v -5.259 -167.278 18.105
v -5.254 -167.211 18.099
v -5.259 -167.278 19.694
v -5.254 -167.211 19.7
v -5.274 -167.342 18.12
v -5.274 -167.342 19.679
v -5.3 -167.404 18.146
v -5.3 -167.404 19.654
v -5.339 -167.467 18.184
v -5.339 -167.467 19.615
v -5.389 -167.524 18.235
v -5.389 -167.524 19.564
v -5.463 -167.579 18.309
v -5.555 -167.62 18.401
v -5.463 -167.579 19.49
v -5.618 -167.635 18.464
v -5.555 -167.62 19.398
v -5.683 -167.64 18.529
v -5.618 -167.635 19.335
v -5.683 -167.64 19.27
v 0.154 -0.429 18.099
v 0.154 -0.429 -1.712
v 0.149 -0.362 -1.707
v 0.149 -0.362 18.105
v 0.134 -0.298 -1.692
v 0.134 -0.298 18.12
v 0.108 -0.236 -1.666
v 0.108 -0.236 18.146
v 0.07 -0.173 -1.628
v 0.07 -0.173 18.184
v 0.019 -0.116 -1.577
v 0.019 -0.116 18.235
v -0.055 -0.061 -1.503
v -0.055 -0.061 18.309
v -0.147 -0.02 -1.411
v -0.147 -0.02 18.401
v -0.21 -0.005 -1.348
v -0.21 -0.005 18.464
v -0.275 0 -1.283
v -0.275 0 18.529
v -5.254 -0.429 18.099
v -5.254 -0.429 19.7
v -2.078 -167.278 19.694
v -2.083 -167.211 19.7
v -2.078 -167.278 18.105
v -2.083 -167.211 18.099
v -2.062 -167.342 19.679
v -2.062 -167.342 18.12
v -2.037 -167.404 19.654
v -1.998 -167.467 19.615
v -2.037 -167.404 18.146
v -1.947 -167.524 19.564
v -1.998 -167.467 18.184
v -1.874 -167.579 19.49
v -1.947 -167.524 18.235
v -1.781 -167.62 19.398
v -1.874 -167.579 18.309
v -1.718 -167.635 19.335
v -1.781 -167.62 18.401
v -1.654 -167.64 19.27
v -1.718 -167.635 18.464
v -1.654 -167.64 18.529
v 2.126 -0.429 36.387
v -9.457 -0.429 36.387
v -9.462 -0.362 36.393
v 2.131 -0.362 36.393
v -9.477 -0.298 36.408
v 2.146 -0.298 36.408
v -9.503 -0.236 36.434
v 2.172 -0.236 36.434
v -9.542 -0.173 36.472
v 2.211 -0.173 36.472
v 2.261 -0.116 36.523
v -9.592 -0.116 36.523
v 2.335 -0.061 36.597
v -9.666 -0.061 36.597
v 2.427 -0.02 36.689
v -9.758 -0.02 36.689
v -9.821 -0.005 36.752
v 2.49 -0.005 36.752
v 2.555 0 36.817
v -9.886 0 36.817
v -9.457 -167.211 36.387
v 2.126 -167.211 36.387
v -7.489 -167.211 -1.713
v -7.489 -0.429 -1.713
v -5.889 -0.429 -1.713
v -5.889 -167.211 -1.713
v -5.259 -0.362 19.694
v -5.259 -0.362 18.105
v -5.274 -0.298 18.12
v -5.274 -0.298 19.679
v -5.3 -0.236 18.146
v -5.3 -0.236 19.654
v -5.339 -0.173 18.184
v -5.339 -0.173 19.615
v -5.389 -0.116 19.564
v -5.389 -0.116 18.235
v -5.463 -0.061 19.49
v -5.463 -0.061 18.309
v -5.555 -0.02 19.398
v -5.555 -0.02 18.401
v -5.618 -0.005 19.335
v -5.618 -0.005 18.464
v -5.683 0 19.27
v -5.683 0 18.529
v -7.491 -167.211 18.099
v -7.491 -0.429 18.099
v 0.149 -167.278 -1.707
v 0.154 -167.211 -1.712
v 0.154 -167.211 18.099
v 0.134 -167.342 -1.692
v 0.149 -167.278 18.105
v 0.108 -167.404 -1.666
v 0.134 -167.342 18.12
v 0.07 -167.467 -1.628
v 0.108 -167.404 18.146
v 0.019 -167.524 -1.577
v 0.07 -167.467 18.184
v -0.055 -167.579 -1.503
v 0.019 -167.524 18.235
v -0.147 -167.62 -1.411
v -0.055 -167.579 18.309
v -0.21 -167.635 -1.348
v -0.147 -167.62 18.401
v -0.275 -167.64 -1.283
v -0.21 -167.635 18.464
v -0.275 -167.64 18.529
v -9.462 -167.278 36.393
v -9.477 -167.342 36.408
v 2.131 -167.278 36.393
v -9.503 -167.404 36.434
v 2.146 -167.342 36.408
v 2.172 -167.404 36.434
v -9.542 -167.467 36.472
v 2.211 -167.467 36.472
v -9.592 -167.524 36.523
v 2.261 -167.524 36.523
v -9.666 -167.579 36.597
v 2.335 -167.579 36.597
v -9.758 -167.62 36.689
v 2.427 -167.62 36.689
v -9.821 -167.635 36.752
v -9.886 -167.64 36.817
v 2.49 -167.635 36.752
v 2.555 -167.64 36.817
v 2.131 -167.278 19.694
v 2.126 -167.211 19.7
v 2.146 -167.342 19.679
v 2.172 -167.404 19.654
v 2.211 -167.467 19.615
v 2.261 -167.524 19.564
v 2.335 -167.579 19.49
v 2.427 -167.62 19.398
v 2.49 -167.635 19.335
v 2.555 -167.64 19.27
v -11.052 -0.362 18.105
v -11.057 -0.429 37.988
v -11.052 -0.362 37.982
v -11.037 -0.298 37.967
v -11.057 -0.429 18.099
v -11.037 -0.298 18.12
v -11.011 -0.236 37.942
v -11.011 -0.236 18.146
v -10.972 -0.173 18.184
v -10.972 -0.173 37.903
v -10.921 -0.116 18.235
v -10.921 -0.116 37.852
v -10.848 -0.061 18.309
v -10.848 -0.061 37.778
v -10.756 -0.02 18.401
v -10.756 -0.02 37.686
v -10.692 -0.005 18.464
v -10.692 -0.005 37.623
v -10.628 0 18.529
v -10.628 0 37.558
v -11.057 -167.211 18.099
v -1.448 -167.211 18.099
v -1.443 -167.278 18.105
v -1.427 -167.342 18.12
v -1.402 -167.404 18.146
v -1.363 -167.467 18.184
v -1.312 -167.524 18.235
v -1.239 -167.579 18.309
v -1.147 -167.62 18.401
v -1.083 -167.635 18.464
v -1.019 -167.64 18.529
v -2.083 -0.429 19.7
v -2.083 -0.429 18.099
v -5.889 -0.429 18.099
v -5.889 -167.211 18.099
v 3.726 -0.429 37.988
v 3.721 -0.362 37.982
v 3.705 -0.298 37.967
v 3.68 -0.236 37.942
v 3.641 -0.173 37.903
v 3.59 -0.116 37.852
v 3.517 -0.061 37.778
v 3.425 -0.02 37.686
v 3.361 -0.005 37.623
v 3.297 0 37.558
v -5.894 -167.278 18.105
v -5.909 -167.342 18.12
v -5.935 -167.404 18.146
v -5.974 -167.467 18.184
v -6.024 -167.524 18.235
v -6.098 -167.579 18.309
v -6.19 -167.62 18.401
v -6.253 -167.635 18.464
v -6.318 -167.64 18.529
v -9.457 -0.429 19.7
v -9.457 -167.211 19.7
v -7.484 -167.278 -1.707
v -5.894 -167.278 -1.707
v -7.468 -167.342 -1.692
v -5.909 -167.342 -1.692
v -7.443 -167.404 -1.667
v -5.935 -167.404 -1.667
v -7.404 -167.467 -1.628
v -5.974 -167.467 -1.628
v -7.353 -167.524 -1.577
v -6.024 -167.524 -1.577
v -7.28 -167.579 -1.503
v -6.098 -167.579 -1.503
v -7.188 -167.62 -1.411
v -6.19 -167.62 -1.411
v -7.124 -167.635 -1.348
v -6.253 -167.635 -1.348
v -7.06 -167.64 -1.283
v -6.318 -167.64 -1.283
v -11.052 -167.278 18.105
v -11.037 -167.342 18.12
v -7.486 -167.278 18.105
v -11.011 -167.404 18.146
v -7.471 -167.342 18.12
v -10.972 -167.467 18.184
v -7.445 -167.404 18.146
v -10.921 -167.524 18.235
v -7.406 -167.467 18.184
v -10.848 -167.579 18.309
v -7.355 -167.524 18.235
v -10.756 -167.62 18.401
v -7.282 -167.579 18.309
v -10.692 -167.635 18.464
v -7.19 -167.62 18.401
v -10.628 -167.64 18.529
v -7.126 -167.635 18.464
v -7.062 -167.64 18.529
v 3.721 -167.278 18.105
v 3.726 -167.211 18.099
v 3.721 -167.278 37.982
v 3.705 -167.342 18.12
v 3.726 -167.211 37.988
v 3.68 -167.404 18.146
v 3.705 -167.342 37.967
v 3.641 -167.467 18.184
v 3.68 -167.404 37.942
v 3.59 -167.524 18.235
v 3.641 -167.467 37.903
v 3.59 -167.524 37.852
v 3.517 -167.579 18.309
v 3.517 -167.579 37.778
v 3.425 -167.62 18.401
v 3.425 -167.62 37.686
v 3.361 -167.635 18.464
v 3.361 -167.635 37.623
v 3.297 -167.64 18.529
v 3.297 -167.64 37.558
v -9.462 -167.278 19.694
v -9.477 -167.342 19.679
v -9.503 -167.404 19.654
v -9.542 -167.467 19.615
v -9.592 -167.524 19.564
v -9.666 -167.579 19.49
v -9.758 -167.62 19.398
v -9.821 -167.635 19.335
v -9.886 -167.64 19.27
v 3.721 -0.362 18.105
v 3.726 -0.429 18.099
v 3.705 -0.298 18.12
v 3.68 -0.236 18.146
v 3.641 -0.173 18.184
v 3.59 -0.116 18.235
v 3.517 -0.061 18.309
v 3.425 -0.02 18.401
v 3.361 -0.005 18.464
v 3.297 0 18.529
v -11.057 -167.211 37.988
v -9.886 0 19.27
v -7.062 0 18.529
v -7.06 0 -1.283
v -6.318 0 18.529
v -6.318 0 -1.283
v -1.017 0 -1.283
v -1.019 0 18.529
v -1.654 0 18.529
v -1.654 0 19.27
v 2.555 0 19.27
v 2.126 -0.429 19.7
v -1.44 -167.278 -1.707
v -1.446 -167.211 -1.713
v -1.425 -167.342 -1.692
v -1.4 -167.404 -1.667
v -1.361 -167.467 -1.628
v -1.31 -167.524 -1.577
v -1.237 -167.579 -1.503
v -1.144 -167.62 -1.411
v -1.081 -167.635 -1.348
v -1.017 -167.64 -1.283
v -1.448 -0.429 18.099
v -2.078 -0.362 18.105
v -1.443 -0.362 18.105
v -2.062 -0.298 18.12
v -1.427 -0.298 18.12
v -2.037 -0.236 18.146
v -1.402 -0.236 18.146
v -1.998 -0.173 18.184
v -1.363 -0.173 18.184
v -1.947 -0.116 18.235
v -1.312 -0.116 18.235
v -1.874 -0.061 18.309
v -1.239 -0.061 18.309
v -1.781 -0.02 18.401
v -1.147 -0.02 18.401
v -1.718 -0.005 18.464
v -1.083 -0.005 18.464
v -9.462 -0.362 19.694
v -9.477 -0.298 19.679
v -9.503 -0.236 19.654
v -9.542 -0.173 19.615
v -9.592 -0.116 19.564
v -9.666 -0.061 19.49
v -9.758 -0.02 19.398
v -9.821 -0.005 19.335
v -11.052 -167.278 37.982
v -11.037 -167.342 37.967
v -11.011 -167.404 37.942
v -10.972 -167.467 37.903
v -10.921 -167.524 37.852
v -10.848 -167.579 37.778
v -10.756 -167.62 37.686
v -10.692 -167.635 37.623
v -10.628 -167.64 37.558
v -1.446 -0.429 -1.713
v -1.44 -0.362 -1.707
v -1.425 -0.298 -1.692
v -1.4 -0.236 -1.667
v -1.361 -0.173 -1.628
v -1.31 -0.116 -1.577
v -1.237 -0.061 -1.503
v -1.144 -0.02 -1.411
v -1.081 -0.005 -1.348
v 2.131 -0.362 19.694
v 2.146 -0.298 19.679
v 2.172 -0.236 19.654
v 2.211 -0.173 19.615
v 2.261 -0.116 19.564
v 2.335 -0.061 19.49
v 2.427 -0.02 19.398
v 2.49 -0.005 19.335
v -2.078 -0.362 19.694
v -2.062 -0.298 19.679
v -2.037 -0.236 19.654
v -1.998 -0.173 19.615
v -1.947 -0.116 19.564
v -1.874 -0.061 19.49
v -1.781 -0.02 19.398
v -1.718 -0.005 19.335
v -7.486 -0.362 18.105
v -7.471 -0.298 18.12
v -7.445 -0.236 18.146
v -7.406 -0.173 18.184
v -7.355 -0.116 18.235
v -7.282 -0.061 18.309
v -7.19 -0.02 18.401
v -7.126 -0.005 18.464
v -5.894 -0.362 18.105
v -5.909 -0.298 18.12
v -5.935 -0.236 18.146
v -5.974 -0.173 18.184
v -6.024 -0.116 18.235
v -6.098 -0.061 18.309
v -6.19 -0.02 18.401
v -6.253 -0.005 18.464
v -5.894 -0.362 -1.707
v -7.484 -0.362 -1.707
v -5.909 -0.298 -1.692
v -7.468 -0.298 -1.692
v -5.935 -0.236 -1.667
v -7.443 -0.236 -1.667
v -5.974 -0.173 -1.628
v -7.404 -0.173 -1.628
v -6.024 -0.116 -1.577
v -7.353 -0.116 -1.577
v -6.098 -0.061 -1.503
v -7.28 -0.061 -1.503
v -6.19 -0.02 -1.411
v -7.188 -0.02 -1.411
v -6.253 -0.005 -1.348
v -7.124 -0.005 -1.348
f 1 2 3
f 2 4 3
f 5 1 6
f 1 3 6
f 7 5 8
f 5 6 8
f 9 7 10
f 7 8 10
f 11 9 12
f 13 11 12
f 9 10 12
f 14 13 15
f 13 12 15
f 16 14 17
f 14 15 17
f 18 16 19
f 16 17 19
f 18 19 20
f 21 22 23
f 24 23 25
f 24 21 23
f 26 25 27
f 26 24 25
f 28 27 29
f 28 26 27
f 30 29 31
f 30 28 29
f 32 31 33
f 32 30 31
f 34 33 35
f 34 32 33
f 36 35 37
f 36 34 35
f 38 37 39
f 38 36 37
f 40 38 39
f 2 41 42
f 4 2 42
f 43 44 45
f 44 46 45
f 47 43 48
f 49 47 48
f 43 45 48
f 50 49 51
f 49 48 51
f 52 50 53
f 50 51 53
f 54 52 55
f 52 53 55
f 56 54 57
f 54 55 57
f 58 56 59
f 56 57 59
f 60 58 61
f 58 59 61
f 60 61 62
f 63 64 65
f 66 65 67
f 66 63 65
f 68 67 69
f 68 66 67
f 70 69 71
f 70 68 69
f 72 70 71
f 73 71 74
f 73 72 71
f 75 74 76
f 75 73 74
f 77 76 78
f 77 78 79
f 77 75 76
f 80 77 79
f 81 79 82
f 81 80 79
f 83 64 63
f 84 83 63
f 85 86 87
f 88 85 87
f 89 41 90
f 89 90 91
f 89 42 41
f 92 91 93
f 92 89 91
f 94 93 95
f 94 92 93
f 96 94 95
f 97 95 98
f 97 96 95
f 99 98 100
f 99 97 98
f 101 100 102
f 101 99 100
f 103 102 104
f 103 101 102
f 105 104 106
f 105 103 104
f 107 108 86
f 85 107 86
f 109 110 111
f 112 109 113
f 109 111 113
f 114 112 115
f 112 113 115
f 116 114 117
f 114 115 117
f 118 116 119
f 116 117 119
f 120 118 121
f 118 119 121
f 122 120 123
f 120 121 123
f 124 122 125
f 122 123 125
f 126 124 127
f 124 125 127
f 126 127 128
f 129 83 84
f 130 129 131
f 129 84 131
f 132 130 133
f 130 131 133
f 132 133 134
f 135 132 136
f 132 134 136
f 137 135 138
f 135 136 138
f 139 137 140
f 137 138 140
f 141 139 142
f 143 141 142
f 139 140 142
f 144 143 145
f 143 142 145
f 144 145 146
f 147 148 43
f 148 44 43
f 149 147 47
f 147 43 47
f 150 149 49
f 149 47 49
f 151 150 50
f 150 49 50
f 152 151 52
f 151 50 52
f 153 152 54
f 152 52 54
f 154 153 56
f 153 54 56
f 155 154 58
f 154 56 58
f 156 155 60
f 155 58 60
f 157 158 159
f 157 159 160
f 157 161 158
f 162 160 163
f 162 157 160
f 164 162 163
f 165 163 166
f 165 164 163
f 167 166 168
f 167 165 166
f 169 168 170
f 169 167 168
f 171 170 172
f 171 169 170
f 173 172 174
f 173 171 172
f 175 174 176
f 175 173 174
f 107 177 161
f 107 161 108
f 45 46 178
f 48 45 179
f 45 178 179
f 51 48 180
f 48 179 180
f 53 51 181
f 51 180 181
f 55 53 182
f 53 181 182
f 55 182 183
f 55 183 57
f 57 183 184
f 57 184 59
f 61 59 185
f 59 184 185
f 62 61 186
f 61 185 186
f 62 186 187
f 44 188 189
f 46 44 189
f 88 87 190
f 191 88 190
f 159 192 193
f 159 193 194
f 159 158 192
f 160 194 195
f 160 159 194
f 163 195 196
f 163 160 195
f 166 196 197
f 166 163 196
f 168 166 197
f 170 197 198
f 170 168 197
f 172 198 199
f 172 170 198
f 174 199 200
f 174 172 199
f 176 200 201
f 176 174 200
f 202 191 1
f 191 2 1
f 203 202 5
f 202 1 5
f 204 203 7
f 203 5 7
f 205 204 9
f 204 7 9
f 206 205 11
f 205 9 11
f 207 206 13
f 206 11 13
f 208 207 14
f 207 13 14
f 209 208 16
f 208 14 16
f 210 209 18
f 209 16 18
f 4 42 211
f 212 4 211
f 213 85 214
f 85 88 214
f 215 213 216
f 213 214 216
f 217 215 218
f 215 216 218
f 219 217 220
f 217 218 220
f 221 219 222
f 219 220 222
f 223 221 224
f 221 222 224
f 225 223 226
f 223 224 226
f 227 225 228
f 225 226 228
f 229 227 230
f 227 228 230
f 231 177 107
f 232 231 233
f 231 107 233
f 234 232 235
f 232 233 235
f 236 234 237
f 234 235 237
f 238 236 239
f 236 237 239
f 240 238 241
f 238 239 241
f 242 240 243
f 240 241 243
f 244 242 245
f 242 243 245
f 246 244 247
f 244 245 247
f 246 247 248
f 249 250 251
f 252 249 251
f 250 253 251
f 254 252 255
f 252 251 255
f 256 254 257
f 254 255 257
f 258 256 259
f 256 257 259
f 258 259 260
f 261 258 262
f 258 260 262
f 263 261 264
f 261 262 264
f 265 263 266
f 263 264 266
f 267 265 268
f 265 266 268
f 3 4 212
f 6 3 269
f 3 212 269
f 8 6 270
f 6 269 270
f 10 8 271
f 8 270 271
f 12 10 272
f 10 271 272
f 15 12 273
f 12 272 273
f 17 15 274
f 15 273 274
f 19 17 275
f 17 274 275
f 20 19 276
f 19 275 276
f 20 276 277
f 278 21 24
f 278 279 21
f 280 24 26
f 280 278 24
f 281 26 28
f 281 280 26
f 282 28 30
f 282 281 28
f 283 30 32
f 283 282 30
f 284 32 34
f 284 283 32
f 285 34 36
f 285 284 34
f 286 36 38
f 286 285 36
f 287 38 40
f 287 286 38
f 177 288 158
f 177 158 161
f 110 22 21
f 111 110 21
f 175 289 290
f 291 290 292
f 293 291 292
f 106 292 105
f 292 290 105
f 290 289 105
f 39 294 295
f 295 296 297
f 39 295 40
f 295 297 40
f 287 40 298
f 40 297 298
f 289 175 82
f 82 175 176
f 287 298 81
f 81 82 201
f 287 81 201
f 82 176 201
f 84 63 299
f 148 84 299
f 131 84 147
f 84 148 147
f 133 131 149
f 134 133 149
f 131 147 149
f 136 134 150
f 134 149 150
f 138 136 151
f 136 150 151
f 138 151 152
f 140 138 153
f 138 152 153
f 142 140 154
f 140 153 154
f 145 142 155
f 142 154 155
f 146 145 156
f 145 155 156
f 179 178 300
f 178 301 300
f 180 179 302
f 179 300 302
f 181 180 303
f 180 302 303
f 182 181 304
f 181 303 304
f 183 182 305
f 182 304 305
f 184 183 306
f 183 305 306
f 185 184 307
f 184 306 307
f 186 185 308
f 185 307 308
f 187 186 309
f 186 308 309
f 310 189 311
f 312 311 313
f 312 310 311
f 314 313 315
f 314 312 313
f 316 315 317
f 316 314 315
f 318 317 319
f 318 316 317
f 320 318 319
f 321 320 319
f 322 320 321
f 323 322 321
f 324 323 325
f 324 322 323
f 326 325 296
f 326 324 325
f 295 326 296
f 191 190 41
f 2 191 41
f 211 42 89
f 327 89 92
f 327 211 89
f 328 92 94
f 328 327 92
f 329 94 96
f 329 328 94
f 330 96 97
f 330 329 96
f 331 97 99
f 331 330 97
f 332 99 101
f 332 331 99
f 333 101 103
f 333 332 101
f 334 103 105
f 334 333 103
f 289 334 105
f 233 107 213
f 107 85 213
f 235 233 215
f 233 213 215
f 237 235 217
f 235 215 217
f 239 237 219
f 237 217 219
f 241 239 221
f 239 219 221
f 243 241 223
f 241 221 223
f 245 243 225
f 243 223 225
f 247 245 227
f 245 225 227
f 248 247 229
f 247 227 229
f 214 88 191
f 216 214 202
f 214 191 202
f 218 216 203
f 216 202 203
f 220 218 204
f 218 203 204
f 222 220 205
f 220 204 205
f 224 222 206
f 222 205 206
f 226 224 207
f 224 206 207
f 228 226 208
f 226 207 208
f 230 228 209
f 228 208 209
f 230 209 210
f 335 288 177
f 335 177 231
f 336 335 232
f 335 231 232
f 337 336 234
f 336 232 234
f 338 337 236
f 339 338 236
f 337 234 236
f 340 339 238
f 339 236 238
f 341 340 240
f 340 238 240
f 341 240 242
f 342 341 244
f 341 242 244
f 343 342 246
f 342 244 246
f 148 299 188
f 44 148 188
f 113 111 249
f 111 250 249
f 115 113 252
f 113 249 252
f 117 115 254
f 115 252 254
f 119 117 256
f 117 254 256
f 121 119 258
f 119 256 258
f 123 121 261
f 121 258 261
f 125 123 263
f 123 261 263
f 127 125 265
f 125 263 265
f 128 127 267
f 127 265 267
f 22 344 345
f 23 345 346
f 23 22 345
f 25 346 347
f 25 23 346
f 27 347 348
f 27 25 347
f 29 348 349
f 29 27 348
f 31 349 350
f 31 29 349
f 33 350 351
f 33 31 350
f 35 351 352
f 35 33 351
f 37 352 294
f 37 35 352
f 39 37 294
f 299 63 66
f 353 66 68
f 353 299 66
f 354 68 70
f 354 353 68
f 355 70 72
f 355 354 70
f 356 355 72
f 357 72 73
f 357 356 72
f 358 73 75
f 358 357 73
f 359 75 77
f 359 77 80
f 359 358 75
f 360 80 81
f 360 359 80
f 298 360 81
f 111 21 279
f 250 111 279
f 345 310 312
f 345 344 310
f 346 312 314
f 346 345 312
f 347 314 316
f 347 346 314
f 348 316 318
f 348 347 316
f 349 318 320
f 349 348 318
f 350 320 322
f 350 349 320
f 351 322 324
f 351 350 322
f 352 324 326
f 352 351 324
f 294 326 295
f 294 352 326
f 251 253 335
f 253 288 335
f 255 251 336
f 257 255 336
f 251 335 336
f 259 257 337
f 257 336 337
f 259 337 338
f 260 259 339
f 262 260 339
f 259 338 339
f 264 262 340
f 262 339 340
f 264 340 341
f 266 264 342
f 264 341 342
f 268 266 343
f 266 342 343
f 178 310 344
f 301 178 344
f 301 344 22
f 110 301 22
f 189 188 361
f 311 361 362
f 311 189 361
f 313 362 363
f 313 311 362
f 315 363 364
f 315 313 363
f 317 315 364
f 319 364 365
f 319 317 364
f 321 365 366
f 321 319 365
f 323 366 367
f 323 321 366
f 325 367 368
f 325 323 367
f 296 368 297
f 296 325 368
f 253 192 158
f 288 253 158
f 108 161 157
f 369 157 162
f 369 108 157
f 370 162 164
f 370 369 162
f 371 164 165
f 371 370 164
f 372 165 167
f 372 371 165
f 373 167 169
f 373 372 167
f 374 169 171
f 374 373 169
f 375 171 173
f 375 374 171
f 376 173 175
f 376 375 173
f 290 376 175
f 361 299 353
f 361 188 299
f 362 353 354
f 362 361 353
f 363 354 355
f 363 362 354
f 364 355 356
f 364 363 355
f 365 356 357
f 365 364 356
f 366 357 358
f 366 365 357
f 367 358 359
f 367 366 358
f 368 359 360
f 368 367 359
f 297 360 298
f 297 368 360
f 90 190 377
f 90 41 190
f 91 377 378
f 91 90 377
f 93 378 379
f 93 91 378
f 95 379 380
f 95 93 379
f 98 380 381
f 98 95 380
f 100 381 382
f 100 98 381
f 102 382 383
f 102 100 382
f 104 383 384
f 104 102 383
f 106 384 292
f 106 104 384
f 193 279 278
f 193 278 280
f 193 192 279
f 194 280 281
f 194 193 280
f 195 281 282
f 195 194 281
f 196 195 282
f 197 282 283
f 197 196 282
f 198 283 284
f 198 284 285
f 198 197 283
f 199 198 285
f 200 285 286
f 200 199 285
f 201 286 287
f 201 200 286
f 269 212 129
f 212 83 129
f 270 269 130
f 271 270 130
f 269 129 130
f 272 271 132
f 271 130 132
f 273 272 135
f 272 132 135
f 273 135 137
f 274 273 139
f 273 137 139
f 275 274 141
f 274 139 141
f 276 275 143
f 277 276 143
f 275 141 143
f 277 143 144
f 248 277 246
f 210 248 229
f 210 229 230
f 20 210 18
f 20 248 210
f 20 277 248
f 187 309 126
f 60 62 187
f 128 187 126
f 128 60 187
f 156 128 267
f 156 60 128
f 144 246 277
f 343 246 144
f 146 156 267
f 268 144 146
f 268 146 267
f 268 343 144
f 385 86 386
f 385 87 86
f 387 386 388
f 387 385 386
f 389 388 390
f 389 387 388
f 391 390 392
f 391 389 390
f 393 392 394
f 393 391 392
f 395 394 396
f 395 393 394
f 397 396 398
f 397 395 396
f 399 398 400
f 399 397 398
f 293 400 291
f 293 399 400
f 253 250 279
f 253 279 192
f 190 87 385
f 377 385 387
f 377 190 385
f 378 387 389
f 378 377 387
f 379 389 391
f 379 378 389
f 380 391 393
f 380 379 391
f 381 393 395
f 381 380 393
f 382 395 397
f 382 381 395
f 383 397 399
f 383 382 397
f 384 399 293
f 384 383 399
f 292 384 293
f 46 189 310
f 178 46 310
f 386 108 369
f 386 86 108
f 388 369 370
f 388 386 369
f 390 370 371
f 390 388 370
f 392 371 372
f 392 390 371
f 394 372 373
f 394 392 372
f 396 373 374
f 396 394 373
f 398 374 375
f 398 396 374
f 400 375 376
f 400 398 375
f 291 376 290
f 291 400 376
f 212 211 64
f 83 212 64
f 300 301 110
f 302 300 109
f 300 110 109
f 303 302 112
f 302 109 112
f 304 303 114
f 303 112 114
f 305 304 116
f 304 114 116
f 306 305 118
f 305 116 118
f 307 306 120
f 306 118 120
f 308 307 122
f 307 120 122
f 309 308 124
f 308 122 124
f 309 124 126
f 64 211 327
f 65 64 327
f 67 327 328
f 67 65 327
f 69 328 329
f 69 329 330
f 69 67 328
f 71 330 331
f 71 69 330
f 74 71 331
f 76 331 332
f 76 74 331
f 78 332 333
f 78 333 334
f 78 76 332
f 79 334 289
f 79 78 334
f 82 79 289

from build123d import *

# Parameters (mm, degrees)
F1_DEPTH = 167.64
F2_R     = 0.429247


with BuildPart() as f1:
    # F0 (on Front) → F1 (new body)
    with BuildSketch(Plane.XZ):
        Polygon((-7.488874, -1.712549), (-5.888674, -1.712549), (-5.888674, 18.099476), (-5.253674, 18.099476), (-5.253674, 19.699676), (-9.456766, 19.699676), (-9.456766, 36.387476), (2.125634, 36.387476), (2.125634, 19.699676), (-2.0828, 19.699676), (-2.0828, 18.099476), (-1.4478, 18.099476), (-1.445737, -1.712549), (0.154463, -1.712382), (0.154463, 18.099476), (3.725834, 18.099476), (3.725834, 37.987676), (-11.056966, 37.987676), (-11.056966, 18.099476), (-7.490937, 18.099476), align=None)
    extrude(amount=F1_DEPTH)

    # F2
    f2_edges = [f1.edges().sort_by_distance(p)[0] for p in [
        (-9.273951, 0, 18.099476),
        (-7.489906, 0, 8.193463),
        (-6.688774, 0, -1.712549),
        (-5.888674, 0, 8.193463),
        (-5.571174, 0, 18.099476),
        (-5.253674, 0, 18.899576),
        (-7.35522, 0, 19.699676),
        (-9.456766, 0, 28.043576),
        (-3.665566, 0, 36.387476),
        (2.125634, 0, 28.043576),
        (0.021417, 0, 19.699676),
        (-2.0828, 0, 18.899576),
        (-1.7653, 0, 18.099476),
        (-1.446769, 0, 8.193463),
        (-0.645637, 0, -1.712466),
        (0.154463, 0, 8.193547),
        (1.940149, 0, 18.099476),
        (3.725834, 0, 28.043576),
        (-3.665566, 0, 37.987676),
        (-11.056966, 0, 28.043576),
        (-9.273951, -167.64, 18.099476),
        (-7.489906, -167.64, 8.193463),
        (-6.688774, -167.64, -1.712549),
        (-5.888674, -167.64, 8.193463),
        (-5.571174, -167.64, 18.099476),
        (-5.253674, -167.64, 18.899576),
        (-7.35522, -167.64, 19.699676),
        (-9.456766, -167.64, 28.043576),
        (-3.665566, -167.64, 36.387476),
        (2.125634, -167.64, 28.043576),
        (0.021417, -167.64, 19.699676),
        (-2.0828, -167.64, 18.899576),
        (-1.7653, -167.64, 18.099476),
        (-1.446769, -167.64, 8.193463),
        (-0.645637, -167.64, -1.712466),
        (0.154463, -167.64, 8.193547),
        (1.940149, -167.64, 18.099476),
        (3.725834, -167.64, 28.043576),
        (-3.665566, -167.64, 37.987676),
        (-11.056966, -167.64, 28.043576),
    ]]
    fillet(f2_edges, radius=F2_R)


solid = f1.part
